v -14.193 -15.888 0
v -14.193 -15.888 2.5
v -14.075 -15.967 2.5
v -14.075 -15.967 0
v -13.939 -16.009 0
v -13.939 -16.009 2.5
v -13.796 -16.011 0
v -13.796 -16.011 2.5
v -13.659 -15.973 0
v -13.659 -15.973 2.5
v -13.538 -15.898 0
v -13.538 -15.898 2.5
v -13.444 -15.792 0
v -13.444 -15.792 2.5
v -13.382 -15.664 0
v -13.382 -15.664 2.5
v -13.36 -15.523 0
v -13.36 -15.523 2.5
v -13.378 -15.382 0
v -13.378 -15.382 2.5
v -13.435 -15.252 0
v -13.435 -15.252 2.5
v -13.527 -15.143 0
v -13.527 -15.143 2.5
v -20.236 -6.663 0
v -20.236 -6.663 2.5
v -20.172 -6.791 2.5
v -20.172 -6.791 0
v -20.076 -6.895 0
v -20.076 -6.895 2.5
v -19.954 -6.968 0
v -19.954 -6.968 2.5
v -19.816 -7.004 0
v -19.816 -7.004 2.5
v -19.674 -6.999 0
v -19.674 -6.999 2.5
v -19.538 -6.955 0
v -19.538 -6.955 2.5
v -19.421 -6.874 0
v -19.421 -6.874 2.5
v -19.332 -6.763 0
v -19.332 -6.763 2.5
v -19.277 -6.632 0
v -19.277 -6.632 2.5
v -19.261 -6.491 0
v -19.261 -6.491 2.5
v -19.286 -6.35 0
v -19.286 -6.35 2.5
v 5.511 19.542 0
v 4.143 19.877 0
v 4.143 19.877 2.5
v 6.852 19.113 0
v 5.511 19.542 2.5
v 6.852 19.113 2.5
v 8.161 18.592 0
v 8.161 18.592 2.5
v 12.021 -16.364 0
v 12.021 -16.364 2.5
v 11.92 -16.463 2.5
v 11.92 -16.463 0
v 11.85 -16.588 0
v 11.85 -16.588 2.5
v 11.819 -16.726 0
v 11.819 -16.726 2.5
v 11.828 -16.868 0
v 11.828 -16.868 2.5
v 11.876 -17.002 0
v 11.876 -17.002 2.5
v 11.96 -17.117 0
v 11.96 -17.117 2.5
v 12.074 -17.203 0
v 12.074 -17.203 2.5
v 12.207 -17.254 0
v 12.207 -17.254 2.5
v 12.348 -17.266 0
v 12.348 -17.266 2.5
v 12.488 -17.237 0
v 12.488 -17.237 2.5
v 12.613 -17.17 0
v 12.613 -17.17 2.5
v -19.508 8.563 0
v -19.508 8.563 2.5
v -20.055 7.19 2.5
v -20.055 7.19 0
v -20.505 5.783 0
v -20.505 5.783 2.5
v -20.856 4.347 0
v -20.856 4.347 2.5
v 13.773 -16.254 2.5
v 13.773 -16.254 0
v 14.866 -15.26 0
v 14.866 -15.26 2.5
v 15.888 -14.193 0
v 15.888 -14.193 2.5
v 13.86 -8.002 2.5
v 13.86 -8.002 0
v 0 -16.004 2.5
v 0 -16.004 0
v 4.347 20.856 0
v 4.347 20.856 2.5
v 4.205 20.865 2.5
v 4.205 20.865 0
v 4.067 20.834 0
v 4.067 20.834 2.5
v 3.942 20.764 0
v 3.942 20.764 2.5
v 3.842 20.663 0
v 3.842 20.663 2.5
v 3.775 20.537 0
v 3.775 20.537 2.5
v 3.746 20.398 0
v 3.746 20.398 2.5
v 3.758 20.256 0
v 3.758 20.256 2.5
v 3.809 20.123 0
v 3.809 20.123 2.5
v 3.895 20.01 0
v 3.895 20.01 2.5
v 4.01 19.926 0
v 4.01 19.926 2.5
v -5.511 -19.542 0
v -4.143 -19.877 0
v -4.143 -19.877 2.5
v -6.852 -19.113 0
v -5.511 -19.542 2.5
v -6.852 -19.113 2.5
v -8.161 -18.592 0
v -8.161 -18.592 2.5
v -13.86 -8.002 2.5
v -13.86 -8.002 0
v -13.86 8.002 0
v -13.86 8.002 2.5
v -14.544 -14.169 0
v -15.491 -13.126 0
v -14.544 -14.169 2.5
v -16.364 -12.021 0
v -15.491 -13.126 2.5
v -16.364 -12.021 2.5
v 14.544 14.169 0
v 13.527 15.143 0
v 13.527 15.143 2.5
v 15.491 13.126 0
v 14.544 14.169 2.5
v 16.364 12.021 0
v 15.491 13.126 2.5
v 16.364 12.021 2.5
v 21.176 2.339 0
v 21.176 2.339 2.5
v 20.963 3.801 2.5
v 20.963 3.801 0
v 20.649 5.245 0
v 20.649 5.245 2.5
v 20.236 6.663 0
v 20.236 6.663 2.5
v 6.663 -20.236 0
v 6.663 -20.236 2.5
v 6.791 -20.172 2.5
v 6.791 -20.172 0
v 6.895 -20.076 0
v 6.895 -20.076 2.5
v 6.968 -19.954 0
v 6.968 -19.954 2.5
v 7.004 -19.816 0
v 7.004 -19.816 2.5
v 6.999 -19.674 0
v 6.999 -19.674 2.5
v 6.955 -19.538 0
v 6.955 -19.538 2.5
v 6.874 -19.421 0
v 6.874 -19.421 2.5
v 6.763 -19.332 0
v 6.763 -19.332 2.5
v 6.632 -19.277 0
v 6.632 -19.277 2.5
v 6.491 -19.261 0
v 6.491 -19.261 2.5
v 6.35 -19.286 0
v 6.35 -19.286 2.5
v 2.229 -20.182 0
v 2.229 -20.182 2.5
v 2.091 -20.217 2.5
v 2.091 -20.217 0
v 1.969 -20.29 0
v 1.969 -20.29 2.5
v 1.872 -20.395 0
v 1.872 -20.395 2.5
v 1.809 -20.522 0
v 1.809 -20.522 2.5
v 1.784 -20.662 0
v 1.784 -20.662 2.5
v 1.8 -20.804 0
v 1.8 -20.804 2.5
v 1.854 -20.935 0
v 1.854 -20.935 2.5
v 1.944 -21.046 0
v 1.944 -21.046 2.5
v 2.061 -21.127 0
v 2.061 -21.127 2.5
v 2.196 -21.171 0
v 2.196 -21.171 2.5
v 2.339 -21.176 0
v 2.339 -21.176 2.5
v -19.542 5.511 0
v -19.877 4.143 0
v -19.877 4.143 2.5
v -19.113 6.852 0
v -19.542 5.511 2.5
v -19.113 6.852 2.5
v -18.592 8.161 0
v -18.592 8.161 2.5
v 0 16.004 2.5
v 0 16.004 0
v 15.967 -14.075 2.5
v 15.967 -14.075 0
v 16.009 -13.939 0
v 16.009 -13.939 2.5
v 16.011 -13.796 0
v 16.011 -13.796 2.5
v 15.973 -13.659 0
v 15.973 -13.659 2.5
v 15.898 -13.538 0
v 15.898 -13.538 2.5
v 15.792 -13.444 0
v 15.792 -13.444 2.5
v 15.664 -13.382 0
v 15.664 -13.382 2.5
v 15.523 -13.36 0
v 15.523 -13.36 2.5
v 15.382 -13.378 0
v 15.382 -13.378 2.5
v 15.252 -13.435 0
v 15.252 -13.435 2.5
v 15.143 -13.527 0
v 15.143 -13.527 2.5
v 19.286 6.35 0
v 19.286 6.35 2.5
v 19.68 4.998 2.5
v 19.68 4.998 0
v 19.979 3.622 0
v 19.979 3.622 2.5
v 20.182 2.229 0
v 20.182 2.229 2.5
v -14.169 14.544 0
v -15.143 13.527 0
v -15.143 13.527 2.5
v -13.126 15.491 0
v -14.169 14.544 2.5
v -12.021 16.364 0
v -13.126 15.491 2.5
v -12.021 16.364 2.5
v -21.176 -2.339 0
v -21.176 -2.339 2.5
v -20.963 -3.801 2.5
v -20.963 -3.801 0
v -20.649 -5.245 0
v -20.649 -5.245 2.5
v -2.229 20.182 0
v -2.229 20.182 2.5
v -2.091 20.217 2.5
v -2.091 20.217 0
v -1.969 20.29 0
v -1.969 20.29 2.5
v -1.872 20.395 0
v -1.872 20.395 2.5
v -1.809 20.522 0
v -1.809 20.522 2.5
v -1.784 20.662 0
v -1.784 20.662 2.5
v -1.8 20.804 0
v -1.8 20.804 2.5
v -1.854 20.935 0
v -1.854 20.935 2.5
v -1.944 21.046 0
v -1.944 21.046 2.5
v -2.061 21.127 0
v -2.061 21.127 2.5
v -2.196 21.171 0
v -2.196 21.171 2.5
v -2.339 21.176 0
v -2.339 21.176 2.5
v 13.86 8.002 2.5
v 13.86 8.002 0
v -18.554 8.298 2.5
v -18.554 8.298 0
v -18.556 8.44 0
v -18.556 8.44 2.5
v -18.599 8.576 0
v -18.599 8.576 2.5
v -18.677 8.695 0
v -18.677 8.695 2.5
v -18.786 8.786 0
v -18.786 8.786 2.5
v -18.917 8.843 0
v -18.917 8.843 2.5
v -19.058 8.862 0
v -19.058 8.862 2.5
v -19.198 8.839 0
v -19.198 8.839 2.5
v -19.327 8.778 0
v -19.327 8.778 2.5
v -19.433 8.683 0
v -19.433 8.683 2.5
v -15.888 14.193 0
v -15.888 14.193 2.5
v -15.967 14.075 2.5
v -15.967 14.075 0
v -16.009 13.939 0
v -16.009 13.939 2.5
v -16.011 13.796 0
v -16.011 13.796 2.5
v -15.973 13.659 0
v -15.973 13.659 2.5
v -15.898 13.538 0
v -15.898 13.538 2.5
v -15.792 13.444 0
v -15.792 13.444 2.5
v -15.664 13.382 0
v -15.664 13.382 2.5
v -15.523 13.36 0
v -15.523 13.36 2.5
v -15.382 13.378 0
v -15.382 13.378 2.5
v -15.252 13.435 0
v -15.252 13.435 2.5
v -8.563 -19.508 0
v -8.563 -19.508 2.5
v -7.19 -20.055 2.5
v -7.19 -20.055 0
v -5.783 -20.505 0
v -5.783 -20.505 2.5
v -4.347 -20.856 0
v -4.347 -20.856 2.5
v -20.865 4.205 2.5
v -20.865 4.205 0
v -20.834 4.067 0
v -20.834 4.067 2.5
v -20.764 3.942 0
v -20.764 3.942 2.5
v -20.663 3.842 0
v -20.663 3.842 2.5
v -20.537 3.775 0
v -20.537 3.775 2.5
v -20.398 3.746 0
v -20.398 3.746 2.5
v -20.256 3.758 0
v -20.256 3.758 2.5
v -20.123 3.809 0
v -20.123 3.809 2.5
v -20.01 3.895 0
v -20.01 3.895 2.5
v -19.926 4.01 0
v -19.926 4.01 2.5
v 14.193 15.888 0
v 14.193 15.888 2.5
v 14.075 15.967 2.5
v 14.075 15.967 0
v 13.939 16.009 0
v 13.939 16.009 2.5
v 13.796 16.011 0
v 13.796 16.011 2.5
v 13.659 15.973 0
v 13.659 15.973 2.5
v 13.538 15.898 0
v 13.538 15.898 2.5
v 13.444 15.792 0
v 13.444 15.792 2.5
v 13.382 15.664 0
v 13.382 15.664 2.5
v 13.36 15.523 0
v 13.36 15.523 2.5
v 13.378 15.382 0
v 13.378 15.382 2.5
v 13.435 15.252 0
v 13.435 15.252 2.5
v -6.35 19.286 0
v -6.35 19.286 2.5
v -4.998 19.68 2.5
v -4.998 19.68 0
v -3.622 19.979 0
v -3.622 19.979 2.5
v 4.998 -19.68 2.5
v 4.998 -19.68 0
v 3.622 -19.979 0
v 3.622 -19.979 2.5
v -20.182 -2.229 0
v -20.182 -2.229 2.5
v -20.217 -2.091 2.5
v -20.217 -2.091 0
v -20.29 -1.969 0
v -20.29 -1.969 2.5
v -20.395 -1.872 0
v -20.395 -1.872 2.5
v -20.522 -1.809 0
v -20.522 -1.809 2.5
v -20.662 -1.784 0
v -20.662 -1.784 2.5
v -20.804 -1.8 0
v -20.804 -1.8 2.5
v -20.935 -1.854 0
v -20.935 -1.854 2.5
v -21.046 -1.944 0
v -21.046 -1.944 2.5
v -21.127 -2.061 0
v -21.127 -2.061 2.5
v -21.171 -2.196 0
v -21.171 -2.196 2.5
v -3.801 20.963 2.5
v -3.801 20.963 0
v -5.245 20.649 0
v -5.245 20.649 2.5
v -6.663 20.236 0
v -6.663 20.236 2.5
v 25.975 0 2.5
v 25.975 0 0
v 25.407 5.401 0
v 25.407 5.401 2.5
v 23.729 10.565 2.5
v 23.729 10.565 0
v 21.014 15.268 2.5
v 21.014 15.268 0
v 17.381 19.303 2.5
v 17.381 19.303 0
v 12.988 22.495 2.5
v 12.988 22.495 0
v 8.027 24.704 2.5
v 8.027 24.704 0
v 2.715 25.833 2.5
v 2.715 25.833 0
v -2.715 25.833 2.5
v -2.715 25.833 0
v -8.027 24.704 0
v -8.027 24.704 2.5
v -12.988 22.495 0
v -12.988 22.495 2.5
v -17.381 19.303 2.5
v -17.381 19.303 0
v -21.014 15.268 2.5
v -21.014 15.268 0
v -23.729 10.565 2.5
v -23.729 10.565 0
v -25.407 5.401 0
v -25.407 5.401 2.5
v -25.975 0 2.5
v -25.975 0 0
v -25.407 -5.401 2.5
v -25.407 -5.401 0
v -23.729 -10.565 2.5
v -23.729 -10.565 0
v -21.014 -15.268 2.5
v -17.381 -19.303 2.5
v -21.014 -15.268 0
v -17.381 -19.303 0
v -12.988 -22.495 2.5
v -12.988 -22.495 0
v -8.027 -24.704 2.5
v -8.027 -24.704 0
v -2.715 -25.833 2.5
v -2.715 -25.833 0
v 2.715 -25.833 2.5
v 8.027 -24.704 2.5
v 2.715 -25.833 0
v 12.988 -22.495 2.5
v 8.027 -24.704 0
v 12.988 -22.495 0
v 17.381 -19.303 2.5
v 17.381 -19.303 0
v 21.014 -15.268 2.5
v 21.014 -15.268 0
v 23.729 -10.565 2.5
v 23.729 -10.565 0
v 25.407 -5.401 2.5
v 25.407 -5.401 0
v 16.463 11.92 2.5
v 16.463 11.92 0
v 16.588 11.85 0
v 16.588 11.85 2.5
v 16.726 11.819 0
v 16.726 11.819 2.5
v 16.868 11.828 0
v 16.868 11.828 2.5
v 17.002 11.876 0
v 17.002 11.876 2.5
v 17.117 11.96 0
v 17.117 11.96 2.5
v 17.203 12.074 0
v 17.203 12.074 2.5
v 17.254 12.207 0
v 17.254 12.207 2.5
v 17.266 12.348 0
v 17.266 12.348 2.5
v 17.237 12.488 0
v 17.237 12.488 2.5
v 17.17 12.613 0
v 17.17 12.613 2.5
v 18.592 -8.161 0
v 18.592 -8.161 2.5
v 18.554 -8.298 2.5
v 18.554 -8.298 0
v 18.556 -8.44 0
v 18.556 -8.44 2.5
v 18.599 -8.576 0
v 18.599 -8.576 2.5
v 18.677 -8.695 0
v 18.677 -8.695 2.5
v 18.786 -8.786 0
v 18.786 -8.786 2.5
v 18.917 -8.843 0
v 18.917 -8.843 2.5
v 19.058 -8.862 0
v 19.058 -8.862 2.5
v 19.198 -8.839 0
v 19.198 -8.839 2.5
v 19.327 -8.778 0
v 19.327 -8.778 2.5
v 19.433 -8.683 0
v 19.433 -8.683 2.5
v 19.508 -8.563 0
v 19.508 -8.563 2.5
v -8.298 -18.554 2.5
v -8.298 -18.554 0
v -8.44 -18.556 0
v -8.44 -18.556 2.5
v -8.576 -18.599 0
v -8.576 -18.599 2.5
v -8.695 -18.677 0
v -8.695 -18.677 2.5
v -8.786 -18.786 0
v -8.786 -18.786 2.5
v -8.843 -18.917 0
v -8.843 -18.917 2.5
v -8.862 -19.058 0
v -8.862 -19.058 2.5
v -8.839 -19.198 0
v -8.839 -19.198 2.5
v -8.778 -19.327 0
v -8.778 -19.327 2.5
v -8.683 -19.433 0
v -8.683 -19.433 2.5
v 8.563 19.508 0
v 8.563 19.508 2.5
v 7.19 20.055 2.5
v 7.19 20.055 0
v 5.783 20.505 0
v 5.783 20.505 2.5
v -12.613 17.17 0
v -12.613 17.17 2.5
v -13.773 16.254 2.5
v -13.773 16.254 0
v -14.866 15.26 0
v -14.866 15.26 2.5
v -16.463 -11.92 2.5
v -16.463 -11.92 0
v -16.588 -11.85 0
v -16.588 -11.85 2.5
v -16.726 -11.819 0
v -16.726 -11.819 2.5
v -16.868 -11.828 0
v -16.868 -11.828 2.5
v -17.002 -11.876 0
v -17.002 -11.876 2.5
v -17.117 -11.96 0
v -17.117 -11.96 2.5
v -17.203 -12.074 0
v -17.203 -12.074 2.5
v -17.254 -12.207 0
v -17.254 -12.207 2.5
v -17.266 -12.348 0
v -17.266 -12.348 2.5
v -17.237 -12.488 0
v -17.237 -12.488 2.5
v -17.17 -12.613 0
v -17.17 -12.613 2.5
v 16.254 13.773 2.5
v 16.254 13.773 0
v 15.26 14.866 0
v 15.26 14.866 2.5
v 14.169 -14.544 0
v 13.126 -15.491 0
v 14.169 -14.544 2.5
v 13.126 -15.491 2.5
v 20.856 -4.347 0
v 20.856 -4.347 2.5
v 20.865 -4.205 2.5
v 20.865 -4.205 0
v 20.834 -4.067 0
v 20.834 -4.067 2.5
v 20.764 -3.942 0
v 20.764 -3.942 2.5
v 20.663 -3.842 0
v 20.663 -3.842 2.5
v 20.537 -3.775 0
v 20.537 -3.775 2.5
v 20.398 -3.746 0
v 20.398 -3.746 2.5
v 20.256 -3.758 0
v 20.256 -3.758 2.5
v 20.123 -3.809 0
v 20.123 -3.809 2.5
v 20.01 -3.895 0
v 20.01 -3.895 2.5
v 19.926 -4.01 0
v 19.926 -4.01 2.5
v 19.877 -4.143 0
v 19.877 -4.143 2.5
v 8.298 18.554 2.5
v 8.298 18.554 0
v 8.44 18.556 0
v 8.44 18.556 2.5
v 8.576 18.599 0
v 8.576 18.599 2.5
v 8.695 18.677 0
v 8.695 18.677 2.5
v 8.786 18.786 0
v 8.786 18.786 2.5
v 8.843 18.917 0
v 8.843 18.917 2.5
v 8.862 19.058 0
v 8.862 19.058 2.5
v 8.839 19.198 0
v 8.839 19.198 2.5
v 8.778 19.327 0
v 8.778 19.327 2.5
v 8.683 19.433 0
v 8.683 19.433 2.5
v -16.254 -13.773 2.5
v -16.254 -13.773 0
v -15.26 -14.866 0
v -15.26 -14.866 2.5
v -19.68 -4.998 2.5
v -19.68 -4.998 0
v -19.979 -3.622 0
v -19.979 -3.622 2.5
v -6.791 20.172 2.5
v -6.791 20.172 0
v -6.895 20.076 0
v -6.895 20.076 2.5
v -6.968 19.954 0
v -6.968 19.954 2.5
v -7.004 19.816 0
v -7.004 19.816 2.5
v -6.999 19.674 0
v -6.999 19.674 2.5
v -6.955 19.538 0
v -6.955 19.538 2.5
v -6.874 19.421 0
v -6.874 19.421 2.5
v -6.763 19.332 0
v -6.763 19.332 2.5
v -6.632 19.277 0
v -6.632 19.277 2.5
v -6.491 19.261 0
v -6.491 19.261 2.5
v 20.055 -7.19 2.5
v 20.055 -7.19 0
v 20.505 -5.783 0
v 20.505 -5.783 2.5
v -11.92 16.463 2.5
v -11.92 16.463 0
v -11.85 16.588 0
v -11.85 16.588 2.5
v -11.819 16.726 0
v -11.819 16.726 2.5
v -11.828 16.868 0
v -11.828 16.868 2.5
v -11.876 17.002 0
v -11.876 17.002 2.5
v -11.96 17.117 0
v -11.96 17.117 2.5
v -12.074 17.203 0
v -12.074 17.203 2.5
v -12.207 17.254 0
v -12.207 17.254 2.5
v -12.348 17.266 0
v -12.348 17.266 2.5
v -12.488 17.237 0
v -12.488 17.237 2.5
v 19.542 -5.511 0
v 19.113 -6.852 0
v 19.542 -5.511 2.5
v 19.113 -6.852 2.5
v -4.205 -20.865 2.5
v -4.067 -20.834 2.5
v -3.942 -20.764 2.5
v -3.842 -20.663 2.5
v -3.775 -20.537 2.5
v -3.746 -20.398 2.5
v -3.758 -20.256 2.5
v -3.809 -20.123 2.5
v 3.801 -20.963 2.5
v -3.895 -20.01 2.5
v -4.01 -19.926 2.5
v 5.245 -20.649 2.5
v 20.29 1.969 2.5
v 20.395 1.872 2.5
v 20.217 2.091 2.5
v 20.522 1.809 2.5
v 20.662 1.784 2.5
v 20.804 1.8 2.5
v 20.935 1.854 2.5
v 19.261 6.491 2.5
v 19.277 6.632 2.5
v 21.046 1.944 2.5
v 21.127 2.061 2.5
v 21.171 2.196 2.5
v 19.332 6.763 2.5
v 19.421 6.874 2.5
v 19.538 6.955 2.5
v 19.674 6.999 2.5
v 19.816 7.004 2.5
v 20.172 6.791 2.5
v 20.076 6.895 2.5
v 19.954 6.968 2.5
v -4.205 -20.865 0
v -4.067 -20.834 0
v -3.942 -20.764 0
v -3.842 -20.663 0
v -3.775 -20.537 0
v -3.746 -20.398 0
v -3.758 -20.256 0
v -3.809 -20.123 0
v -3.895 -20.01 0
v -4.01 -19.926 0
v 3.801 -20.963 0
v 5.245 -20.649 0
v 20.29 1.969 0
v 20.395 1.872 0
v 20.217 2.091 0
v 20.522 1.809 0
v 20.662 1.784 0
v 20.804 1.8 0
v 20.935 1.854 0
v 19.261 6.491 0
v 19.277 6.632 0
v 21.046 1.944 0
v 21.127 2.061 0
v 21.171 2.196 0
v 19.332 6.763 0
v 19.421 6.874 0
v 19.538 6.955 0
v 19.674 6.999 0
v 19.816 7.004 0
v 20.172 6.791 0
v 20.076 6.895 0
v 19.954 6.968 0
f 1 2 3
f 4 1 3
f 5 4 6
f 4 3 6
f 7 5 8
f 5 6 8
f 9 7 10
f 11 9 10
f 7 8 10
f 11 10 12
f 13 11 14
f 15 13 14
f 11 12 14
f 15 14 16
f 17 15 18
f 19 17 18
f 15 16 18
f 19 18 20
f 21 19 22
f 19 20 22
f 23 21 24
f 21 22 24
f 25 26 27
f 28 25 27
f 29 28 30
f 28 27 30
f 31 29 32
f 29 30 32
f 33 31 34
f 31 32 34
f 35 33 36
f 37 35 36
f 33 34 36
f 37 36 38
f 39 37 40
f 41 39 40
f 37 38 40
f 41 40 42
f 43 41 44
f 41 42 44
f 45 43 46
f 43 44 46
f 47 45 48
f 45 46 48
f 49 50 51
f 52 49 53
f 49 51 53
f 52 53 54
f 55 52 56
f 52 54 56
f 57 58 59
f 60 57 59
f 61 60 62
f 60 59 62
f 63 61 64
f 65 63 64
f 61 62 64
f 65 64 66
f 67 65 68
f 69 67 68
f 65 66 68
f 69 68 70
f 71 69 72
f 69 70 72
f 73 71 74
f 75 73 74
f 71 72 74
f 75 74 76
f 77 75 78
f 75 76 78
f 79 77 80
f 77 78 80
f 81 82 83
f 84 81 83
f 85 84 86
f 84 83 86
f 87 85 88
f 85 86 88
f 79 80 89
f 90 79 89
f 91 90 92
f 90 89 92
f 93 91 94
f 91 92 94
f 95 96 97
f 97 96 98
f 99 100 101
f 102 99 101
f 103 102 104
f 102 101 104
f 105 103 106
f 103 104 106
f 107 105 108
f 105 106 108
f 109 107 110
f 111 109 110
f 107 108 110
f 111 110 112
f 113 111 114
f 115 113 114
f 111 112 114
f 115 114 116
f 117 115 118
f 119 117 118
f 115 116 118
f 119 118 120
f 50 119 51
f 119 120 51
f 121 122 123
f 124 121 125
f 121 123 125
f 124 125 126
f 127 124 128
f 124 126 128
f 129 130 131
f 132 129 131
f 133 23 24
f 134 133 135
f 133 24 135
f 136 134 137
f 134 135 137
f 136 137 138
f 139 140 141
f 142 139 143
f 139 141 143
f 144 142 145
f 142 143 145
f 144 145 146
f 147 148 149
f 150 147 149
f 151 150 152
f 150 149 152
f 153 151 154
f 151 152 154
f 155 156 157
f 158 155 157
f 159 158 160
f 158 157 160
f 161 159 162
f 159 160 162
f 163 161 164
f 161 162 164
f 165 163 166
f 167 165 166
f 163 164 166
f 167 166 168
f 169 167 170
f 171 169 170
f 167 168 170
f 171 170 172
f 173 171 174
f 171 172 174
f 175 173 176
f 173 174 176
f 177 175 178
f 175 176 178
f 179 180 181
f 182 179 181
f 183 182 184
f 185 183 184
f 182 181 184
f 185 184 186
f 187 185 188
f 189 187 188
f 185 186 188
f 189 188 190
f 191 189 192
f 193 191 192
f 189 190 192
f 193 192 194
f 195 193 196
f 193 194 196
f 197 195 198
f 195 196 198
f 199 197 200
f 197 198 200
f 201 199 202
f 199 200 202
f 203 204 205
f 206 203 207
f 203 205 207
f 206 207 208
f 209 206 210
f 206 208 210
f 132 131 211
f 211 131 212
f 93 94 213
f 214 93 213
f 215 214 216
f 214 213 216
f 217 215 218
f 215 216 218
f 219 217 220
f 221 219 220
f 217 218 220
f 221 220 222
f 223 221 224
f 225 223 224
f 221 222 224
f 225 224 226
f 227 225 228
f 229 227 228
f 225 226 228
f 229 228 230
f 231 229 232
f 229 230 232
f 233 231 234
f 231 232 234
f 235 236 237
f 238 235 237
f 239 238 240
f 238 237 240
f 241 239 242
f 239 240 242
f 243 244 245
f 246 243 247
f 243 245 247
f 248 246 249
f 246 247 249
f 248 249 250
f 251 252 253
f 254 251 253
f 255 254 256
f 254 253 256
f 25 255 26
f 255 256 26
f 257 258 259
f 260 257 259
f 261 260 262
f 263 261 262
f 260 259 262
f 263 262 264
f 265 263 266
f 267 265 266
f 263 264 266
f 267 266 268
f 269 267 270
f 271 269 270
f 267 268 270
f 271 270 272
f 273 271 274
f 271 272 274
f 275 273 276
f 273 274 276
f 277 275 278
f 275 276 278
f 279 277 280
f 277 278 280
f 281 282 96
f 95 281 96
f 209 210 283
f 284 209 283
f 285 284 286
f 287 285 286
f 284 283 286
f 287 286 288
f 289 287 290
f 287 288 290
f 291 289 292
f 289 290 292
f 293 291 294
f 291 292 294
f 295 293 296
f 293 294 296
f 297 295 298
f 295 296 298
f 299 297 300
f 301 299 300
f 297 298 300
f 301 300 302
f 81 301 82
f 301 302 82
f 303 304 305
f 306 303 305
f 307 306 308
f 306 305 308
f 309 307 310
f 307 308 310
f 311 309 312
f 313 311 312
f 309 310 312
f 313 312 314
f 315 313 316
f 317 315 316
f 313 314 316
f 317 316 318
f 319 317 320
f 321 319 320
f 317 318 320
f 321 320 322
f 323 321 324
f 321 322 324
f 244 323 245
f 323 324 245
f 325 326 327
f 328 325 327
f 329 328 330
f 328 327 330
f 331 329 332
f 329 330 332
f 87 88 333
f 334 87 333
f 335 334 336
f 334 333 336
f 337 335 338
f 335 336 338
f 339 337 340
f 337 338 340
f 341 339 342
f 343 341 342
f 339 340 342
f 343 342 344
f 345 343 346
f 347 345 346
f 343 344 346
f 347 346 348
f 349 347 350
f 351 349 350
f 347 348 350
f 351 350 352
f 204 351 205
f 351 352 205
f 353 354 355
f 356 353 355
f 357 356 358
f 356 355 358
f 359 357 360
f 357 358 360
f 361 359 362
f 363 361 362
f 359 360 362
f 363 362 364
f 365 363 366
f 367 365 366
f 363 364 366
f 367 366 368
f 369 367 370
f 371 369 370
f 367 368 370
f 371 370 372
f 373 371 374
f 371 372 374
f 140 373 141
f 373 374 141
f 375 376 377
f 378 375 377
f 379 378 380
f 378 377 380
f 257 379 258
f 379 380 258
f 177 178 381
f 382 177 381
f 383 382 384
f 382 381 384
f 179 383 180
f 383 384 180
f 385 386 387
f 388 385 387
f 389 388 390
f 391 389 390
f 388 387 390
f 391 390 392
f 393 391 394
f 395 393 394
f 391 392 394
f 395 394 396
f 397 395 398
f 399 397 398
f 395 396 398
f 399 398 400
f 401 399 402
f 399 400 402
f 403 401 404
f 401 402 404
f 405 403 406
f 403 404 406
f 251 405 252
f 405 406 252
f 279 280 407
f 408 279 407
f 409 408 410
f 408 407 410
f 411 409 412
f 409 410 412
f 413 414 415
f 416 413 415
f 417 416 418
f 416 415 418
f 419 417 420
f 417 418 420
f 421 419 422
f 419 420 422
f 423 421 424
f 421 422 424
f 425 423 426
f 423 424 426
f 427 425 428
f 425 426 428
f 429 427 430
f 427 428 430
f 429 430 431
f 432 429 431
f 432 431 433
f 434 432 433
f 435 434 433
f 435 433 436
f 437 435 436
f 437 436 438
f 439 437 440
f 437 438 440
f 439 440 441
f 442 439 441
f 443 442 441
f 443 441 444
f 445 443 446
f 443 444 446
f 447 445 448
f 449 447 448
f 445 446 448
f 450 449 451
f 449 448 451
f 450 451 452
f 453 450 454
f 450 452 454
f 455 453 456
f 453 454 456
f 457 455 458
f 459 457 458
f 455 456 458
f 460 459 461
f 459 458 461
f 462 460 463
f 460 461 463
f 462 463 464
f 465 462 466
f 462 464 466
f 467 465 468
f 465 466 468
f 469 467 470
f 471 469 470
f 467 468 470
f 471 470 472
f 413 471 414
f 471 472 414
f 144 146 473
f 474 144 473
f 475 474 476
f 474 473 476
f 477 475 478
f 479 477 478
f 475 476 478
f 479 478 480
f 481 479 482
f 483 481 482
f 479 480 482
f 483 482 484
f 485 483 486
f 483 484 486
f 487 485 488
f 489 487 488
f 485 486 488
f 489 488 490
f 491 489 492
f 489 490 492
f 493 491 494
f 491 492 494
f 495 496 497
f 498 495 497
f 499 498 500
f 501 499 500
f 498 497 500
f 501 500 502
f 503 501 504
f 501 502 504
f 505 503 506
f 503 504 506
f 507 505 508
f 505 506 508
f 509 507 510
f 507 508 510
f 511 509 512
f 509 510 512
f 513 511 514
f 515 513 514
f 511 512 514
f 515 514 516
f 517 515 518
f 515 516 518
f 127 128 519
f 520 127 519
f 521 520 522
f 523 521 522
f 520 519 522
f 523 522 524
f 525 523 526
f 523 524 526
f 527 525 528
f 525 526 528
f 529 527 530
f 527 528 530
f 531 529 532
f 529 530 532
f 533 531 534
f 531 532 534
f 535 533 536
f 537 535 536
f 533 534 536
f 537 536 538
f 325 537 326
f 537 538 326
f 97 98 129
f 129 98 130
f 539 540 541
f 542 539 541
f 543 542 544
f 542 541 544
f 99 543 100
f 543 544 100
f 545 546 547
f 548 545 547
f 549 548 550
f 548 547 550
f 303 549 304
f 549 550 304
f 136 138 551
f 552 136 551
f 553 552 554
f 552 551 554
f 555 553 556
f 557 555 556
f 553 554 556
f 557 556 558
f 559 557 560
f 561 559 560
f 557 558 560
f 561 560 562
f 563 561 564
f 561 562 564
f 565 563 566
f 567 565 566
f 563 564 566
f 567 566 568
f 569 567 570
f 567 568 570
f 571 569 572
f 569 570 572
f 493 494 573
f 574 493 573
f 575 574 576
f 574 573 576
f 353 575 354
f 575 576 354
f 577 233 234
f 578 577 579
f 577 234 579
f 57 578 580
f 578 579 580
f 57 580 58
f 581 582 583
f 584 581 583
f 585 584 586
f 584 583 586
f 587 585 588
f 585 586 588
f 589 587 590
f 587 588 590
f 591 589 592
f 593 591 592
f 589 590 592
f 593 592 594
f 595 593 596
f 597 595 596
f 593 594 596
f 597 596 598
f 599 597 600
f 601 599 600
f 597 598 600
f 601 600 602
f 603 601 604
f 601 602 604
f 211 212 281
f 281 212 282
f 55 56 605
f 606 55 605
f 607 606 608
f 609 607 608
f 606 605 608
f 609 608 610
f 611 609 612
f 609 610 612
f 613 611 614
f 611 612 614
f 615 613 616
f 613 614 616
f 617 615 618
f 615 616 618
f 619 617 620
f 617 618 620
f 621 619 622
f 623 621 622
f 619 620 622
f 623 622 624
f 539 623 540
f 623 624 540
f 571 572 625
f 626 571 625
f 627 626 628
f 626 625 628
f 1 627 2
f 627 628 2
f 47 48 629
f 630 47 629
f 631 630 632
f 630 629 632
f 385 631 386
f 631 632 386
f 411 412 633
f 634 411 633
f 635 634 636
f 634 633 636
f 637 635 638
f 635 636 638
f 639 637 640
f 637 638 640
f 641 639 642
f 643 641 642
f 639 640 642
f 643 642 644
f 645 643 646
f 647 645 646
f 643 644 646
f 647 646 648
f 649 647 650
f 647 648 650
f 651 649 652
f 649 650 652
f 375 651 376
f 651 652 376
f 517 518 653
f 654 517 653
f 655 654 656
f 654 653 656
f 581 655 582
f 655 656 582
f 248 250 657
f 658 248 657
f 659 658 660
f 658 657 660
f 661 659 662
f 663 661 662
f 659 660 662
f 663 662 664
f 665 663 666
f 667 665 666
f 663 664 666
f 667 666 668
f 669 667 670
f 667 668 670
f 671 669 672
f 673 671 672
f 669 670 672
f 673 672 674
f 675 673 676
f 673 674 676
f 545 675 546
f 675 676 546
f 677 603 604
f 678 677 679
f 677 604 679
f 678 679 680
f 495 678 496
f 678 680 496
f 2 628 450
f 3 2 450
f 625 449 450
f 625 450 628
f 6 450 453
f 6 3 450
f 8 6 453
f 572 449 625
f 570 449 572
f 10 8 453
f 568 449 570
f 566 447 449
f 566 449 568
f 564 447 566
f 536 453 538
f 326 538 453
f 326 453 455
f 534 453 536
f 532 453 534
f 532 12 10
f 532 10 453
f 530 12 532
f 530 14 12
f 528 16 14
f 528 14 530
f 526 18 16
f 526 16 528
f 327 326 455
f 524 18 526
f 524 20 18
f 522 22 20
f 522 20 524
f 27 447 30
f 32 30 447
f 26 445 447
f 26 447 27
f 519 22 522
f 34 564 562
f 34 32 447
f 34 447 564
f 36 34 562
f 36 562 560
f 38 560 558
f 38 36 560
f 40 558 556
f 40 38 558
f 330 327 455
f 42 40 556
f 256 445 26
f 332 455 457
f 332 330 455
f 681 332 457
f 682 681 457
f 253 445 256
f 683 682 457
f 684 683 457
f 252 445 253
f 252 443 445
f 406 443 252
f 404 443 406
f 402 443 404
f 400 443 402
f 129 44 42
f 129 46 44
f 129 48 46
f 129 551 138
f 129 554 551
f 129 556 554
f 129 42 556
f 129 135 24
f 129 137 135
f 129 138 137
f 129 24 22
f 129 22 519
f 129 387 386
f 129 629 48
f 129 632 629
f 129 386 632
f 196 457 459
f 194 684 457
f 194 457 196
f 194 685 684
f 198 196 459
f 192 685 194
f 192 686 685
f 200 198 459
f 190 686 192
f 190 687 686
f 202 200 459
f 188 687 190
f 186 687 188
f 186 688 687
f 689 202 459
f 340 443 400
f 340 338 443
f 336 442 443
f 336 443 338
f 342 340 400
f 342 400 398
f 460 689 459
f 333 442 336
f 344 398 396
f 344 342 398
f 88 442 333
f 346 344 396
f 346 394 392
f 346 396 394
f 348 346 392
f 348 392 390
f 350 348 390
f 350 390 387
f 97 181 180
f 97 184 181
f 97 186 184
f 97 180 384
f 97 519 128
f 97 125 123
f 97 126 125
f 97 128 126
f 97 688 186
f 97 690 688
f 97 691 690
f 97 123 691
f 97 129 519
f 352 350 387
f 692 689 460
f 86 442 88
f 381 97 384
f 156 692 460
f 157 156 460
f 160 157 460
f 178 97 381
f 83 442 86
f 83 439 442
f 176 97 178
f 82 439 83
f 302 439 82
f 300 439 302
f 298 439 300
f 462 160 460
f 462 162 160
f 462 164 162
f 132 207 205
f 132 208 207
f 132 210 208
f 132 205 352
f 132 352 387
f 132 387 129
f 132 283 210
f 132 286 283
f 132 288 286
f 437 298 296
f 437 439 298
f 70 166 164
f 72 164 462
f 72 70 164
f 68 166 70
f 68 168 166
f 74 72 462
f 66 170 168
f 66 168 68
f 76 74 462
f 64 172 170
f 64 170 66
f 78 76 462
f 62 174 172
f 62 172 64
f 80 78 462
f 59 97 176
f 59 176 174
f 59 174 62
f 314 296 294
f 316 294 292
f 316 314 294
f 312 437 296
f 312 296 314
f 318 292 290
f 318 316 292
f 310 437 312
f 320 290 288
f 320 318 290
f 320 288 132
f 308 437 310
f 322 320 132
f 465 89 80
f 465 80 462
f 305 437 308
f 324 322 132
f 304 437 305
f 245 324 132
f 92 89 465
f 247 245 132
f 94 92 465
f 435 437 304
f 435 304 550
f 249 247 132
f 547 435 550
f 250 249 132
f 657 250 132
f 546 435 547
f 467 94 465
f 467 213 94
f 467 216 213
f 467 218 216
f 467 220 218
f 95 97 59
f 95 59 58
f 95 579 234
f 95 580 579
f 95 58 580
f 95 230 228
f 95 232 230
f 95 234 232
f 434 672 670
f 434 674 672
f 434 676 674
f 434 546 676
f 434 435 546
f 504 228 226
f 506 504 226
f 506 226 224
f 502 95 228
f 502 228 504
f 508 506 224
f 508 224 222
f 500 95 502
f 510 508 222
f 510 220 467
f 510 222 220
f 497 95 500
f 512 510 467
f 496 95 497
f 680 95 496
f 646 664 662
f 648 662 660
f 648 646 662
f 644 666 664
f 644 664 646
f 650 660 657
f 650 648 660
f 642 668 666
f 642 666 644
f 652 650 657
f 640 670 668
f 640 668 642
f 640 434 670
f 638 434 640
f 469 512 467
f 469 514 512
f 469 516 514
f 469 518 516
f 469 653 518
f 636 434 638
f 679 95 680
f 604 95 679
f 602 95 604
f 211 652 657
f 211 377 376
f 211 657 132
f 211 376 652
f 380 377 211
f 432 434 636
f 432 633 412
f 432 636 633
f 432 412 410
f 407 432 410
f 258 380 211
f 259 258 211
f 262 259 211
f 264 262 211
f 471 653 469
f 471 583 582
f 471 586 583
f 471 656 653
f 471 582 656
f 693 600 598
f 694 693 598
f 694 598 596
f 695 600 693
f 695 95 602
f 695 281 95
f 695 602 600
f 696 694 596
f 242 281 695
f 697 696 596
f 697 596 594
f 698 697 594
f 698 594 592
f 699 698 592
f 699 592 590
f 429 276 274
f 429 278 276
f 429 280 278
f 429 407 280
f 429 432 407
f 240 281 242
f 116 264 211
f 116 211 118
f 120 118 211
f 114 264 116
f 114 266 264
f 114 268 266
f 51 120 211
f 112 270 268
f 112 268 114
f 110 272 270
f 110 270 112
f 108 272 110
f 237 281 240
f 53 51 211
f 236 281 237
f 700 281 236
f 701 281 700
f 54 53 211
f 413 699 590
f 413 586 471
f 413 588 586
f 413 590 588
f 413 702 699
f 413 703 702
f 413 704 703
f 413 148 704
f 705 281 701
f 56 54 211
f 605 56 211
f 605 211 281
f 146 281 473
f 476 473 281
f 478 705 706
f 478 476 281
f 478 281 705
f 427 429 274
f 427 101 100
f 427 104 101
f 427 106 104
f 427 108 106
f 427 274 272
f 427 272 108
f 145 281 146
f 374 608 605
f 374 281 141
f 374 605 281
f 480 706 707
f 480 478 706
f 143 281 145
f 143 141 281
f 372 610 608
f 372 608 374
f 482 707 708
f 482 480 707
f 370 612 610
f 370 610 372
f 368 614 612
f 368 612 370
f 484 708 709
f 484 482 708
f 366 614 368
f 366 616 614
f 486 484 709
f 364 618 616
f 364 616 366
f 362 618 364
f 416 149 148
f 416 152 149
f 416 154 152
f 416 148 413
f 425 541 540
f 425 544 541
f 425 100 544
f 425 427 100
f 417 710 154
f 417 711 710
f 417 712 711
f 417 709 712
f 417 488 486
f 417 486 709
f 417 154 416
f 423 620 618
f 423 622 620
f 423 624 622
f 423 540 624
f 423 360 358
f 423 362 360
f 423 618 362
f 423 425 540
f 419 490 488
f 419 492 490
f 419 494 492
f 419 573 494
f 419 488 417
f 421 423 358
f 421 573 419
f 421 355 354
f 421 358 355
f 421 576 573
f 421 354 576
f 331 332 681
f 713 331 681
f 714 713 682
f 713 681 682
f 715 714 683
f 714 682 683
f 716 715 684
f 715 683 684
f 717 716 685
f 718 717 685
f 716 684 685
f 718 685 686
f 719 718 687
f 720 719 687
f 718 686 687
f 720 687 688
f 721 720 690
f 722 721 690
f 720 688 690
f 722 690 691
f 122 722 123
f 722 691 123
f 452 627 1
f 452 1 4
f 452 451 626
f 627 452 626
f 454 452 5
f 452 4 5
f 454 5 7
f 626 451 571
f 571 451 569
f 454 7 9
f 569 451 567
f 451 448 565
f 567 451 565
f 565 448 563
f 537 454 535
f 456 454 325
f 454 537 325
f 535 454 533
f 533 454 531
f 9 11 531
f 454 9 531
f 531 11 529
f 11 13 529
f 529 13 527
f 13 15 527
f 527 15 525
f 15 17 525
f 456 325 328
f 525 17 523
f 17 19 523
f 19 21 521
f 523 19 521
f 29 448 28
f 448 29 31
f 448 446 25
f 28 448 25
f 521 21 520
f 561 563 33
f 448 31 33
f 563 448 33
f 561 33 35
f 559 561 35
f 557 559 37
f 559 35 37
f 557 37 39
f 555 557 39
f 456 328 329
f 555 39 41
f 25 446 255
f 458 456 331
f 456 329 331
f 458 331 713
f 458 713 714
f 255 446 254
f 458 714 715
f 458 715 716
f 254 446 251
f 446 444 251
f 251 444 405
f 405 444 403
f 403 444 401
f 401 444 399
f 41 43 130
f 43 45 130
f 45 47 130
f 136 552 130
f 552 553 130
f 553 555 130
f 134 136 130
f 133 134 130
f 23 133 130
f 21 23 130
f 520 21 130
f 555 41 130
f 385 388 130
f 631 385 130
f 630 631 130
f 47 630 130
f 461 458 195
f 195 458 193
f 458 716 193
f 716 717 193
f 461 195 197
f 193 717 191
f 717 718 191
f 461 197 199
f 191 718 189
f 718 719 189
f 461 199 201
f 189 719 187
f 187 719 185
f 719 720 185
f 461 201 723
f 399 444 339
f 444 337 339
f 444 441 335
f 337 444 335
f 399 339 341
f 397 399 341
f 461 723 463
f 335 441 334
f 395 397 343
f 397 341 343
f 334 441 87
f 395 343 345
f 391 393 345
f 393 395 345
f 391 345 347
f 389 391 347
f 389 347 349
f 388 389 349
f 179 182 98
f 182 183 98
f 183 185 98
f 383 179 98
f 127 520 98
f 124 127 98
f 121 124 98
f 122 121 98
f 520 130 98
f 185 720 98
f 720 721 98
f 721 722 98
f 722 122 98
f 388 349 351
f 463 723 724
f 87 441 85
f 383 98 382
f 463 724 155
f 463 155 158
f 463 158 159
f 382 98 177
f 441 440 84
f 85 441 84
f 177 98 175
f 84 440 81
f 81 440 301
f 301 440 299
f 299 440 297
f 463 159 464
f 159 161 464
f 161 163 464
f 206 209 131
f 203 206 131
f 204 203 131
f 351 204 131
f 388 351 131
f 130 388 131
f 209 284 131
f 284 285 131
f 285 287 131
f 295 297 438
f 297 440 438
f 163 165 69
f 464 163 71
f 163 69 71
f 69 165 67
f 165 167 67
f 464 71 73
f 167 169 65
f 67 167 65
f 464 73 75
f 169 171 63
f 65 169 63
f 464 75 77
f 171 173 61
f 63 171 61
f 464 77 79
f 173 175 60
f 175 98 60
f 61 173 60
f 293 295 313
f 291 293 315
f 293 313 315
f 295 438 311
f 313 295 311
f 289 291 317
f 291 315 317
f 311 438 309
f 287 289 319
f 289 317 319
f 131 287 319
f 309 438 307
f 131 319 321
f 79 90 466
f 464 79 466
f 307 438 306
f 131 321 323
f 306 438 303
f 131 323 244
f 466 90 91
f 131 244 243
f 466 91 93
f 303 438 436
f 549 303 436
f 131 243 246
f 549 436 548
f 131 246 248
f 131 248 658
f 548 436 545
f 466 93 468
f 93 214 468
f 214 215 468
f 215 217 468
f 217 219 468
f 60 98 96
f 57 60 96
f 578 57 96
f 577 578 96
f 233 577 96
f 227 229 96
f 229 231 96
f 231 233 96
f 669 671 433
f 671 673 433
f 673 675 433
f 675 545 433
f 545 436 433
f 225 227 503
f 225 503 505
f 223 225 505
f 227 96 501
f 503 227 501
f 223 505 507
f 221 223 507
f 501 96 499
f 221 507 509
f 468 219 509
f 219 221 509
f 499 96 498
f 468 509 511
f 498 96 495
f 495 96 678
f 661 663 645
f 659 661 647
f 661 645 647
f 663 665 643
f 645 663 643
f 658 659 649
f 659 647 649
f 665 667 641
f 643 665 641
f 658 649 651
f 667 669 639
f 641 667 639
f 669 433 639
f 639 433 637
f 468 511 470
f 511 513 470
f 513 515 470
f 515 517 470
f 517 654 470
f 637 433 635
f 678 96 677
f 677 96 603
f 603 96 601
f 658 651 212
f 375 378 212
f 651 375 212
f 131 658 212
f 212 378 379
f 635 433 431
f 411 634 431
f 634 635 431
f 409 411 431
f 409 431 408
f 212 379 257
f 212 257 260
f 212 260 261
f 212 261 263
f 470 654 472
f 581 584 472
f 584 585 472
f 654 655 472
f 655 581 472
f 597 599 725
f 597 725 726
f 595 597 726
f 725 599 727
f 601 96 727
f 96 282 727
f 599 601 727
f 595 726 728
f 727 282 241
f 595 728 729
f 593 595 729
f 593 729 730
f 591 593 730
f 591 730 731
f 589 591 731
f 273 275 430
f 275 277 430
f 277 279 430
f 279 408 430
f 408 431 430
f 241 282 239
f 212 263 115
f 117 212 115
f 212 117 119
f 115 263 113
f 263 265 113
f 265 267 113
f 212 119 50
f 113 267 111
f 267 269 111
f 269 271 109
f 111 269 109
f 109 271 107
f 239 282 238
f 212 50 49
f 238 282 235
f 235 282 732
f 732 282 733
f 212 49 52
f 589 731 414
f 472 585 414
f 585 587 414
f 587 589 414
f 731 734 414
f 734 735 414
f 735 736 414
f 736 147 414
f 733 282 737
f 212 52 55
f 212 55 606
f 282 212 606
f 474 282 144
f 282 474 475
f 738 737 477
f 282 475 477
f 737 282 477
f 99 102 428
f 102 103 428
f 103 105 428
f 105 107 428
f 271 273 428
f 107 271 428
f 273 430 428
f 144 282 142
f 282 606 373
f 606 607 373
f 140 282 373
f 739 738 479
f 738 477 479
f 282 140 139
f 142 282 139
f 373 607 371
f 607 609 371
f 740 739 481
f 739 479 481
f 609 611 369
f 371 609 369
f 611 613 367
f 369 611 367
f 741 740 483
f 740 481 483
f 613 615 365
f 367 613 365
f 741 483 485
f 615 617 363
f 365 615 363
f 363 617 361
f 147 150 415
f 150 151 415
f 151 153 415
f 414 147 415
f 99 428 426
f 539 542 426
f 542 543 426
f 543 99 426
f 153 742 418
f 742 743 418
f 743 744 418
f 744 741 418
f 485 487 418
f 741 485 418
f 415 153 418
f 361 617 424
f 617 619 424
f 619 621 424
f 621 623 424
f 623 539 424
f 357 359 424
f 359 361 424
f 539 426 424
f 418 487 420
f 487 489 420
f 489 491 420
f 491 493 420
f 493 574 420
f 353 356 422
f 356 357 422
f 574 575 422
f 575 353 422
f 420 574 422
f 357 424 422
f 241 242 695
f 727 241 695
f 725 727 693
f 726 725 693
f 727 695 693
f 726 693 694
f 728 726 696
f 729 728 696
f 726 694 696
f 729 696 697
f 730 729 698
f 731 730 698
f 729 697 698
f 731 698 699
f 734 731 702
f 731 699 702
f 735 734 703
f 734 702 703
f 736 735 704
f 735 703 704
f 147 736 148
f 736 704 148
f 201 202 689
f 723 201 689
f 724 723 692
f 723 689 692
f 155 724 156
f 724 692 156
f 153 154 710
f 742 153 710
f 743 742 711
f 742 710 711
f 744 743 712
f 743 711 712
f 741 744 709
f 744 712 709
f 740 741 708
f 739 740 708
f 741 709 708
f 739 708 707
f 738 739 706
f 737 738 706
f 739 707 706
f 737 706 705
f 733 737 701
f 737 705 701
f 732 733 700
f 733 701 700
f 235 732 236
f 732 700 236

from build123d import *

# Parameters (mm, degrees)
F0_R     = 25.975
F1_DEPTH = 2.5
F3_DEPTH = 3


with BuildPart() as f1:
    # F0 (on Top) → F1 (new body)
    with BuildSketch(Plane.XY):
        Circle(F0_R)
        Polygon((-13.86, 8.002075), (0, 16.004149), (13.86, 8.002075), (13.86, -8.002075), (0, -16.004149), (-13.86, -8.002075), align=None, mode=Mode.SUBTRACT)
    extrude(amount=F1_DEPTH)

    # F2 (on face) → F3 (cut)
    with BuildSketch(Plane.XY.offset(2.5)):
        with BuildLine():
            ThreePointArc((16.363608, 12.021167), (17.062582, 11.914235), (17.169515, 12.613209))
            ThreePointArc((17.169515, 12.613209), (15.766582, 14.3283), (14.1931, 15.888398))
            ThreePointArc((14.1931, 15.888398), (13.487113, 15.848611), (13.5269, 15.142625))
            ThreePointArc((13.5269, 15.142625), (15.026526, 13.655754), (16.363608, 12.021167))
        make_face()
        with BuildLine():
            ThreePointArc((8.160716, 18.59244), (8.819512, 18.849321), (8.562631, 19.508117))
            ThreePointArc((8.562631, 19.508117), (6.490111, 20.291962), (4.347386, 20.856306))
            ThreePointArc((4.347386, 20.856306), (3.755877, 20.468856), (4.143327, 19.877348))
            ThreePointArc((4.143327, 19.877348), (6.185476, 19.339493), (8.160716, 18.59244))
        make_face()
        with BuildLine():
            ThreePointArc((-2.228832, 20.181883), (-1.786739, 20.733747), (-2.338602, 21.17584))
            ThreePointArc((-2.338602, 21.17584), (-4.52538, 20.81841), (-6.663207, 20.235784))
            ThreePointArc((-6.663207, 20.235784), (-6.981743, 19.604488), (-6.350447, 19.285952))
            ThreePointArc((-6.350447, 19.285952), (-4.312967, 19.841231), (-2.228832, 20.181883))
        make_face()
        with BuildLine():
            ThreePointArc((-12.021167, 16.363608), (-11.914235, 17.062582), (-12.613209, 17.169515))
            ThreePointArc((-12.613209, 17.169515), (-14.3283, 15.766582), (-15.888398, 14.1931))
            ThreePointArc((-15.888398, 14.1931), (-15.848611, 13.487113), (-15.142625, 13.5269))
            ThreePointArc((-15.142625, 13.5269), (-13.655754, 15.026526), (-12.021167, 16.363608))
        make_face()
        with BuildLine():
            ThreePointArc((-18.59244, 8.160716), (-18.849321, 8.819512), (-19.508117, 8.562631))
            ThreePointArc((-19.508117, 8.562631), (-20.291962, 6.490111), (-20.856306, 4.347386))
            ThreePointArc((-20.856306, 4.347386), (-20.468856, 3.755877), (-19.877348, 4.143327))
            ThreePointArc((-19.877348, 4.143327), (-19.339493, 6.185476), (-18.59244, 8.160716))
        make_face()
        with BuildLine():
            ThreePointArc((-20.181883, -2.228832), (-20.733747, -1.786739), (-21.17584, -2.338602))
            ThreePointArc((-21.17584, -2.338602), (-20.81841, -4.52538), (-20.235784, -6.663207))
            ThreePointArc((-20.235784, -6.663207), (-19.604488, -6.981743), (-19.285952, -6.350447))
            ThreePointArc((-19.285952, -6.350447), (-19.841231, -4.312967), (-20.181883, -2.228832))
        make_face()
        with BuildLine():
            ThreePointArc((-16.363608, -12.021167), (-17.062582, -11.914235), (-17.169515, -12.613209))
            ThreePointArc((-17.169515, -12.613209), (-15.766582, -14.3283), (-14.1931, -15.888398))
            ThreePointArc((-14.1931, -15.888398), (-13.487113, -15.848611), (-13.5269, -15.142625))
            ThreePointArc((-13.5269, -15.142625), (-15.026526, -13.655754), (-16.363608, -12.021167))
        make_face()
        with BuildLine():
            ThreePointArc((-8.160716, -18.59244), (-8.819512, -18.849321), (-8.562631, -19.508117))
            ThreePointArc((-8.562631, -19.508117), (-6.490111, -20.291962), (-4.347386, -20.856306))
            ThreePointArc((-4.347386, -20.856306), (-3.755877, -20.468856), (-4.143327, -19.877348))
            ThreePointArc((-4.143327, -19.877348), (-6.185476, -19.339493), (-8.160716, -18.59244))
        make_face()
        with BuildLine():
            ThreePointArc((2.228832, -20.181883), (1.786739, -20.733747), (2.338602, -21.17584))
            ThreePointArc((2.338602, -21.17584), (4.52538, -20.81841), (6.663207, -20.235784))
            ThreePointArc((6.663207, -20.235784), (6.981743, -19.604488), (6.350447, -19.285952))
            ThreePointArc((6.350447, -19.285952), (4.312967, -19.841231), (2.228832, -20.181883))
        make_face()
        with BuildLine():
            ThreePointArc((12.021167, -16.363608), (11.914235, -17.062582), (12.613209, -17.169515))
            ThreePointArc((12.613209, -17.169515), (14.3283, -15.766582), (15.888398, -14.1931))
            ThreePointArc((15.888398, -14.1931), (15.848611, -13.487113), (15.142625, -13.5269))
            ThreePointArc((15.142625, -13.5269), (13.655754, -15.026526), (12.021167, -16.363608))
        make_face()
        with BuildLine():
            ThreePointArc((18.59244, -8.160716), (18.849321, -8.819512), (19.508117, -8.562631))
            ThreePointArc((19.508117, -8.562631), (20.291962, -6.490111), (20.856306, -4.347386))
            ThreePointArc((20.856306, -4.347386), (20.468856, -3.755877), (19.877348, -4.143327))
            ThreePointArc((19.877348, -4.143327), (19.339493, -6.185476), (18.59244, -8.160716))
        make_face()
        with BuildLine():
            ThreePointArc((20.181883, 2.228832), (20.733747, 1.786739), (21.17584, 2.338602))
            ThreePointArc((21.17584, 2.338602), (20.81841, 4.52538), (20.235784, 6.663207))
            ThreePointArc((20.235784, 6.663207), (19.604488, 6.981743), (19.285952, 6.350447))
            ThreePointArc((19.285952, 6.350447), (19.841231, 4.312967), (20.181883, 2.228832))
        make_face()
    extrude(amount=-F3_DEPTH, mode=Mode.SUBTRACT)


solid = f1.part
